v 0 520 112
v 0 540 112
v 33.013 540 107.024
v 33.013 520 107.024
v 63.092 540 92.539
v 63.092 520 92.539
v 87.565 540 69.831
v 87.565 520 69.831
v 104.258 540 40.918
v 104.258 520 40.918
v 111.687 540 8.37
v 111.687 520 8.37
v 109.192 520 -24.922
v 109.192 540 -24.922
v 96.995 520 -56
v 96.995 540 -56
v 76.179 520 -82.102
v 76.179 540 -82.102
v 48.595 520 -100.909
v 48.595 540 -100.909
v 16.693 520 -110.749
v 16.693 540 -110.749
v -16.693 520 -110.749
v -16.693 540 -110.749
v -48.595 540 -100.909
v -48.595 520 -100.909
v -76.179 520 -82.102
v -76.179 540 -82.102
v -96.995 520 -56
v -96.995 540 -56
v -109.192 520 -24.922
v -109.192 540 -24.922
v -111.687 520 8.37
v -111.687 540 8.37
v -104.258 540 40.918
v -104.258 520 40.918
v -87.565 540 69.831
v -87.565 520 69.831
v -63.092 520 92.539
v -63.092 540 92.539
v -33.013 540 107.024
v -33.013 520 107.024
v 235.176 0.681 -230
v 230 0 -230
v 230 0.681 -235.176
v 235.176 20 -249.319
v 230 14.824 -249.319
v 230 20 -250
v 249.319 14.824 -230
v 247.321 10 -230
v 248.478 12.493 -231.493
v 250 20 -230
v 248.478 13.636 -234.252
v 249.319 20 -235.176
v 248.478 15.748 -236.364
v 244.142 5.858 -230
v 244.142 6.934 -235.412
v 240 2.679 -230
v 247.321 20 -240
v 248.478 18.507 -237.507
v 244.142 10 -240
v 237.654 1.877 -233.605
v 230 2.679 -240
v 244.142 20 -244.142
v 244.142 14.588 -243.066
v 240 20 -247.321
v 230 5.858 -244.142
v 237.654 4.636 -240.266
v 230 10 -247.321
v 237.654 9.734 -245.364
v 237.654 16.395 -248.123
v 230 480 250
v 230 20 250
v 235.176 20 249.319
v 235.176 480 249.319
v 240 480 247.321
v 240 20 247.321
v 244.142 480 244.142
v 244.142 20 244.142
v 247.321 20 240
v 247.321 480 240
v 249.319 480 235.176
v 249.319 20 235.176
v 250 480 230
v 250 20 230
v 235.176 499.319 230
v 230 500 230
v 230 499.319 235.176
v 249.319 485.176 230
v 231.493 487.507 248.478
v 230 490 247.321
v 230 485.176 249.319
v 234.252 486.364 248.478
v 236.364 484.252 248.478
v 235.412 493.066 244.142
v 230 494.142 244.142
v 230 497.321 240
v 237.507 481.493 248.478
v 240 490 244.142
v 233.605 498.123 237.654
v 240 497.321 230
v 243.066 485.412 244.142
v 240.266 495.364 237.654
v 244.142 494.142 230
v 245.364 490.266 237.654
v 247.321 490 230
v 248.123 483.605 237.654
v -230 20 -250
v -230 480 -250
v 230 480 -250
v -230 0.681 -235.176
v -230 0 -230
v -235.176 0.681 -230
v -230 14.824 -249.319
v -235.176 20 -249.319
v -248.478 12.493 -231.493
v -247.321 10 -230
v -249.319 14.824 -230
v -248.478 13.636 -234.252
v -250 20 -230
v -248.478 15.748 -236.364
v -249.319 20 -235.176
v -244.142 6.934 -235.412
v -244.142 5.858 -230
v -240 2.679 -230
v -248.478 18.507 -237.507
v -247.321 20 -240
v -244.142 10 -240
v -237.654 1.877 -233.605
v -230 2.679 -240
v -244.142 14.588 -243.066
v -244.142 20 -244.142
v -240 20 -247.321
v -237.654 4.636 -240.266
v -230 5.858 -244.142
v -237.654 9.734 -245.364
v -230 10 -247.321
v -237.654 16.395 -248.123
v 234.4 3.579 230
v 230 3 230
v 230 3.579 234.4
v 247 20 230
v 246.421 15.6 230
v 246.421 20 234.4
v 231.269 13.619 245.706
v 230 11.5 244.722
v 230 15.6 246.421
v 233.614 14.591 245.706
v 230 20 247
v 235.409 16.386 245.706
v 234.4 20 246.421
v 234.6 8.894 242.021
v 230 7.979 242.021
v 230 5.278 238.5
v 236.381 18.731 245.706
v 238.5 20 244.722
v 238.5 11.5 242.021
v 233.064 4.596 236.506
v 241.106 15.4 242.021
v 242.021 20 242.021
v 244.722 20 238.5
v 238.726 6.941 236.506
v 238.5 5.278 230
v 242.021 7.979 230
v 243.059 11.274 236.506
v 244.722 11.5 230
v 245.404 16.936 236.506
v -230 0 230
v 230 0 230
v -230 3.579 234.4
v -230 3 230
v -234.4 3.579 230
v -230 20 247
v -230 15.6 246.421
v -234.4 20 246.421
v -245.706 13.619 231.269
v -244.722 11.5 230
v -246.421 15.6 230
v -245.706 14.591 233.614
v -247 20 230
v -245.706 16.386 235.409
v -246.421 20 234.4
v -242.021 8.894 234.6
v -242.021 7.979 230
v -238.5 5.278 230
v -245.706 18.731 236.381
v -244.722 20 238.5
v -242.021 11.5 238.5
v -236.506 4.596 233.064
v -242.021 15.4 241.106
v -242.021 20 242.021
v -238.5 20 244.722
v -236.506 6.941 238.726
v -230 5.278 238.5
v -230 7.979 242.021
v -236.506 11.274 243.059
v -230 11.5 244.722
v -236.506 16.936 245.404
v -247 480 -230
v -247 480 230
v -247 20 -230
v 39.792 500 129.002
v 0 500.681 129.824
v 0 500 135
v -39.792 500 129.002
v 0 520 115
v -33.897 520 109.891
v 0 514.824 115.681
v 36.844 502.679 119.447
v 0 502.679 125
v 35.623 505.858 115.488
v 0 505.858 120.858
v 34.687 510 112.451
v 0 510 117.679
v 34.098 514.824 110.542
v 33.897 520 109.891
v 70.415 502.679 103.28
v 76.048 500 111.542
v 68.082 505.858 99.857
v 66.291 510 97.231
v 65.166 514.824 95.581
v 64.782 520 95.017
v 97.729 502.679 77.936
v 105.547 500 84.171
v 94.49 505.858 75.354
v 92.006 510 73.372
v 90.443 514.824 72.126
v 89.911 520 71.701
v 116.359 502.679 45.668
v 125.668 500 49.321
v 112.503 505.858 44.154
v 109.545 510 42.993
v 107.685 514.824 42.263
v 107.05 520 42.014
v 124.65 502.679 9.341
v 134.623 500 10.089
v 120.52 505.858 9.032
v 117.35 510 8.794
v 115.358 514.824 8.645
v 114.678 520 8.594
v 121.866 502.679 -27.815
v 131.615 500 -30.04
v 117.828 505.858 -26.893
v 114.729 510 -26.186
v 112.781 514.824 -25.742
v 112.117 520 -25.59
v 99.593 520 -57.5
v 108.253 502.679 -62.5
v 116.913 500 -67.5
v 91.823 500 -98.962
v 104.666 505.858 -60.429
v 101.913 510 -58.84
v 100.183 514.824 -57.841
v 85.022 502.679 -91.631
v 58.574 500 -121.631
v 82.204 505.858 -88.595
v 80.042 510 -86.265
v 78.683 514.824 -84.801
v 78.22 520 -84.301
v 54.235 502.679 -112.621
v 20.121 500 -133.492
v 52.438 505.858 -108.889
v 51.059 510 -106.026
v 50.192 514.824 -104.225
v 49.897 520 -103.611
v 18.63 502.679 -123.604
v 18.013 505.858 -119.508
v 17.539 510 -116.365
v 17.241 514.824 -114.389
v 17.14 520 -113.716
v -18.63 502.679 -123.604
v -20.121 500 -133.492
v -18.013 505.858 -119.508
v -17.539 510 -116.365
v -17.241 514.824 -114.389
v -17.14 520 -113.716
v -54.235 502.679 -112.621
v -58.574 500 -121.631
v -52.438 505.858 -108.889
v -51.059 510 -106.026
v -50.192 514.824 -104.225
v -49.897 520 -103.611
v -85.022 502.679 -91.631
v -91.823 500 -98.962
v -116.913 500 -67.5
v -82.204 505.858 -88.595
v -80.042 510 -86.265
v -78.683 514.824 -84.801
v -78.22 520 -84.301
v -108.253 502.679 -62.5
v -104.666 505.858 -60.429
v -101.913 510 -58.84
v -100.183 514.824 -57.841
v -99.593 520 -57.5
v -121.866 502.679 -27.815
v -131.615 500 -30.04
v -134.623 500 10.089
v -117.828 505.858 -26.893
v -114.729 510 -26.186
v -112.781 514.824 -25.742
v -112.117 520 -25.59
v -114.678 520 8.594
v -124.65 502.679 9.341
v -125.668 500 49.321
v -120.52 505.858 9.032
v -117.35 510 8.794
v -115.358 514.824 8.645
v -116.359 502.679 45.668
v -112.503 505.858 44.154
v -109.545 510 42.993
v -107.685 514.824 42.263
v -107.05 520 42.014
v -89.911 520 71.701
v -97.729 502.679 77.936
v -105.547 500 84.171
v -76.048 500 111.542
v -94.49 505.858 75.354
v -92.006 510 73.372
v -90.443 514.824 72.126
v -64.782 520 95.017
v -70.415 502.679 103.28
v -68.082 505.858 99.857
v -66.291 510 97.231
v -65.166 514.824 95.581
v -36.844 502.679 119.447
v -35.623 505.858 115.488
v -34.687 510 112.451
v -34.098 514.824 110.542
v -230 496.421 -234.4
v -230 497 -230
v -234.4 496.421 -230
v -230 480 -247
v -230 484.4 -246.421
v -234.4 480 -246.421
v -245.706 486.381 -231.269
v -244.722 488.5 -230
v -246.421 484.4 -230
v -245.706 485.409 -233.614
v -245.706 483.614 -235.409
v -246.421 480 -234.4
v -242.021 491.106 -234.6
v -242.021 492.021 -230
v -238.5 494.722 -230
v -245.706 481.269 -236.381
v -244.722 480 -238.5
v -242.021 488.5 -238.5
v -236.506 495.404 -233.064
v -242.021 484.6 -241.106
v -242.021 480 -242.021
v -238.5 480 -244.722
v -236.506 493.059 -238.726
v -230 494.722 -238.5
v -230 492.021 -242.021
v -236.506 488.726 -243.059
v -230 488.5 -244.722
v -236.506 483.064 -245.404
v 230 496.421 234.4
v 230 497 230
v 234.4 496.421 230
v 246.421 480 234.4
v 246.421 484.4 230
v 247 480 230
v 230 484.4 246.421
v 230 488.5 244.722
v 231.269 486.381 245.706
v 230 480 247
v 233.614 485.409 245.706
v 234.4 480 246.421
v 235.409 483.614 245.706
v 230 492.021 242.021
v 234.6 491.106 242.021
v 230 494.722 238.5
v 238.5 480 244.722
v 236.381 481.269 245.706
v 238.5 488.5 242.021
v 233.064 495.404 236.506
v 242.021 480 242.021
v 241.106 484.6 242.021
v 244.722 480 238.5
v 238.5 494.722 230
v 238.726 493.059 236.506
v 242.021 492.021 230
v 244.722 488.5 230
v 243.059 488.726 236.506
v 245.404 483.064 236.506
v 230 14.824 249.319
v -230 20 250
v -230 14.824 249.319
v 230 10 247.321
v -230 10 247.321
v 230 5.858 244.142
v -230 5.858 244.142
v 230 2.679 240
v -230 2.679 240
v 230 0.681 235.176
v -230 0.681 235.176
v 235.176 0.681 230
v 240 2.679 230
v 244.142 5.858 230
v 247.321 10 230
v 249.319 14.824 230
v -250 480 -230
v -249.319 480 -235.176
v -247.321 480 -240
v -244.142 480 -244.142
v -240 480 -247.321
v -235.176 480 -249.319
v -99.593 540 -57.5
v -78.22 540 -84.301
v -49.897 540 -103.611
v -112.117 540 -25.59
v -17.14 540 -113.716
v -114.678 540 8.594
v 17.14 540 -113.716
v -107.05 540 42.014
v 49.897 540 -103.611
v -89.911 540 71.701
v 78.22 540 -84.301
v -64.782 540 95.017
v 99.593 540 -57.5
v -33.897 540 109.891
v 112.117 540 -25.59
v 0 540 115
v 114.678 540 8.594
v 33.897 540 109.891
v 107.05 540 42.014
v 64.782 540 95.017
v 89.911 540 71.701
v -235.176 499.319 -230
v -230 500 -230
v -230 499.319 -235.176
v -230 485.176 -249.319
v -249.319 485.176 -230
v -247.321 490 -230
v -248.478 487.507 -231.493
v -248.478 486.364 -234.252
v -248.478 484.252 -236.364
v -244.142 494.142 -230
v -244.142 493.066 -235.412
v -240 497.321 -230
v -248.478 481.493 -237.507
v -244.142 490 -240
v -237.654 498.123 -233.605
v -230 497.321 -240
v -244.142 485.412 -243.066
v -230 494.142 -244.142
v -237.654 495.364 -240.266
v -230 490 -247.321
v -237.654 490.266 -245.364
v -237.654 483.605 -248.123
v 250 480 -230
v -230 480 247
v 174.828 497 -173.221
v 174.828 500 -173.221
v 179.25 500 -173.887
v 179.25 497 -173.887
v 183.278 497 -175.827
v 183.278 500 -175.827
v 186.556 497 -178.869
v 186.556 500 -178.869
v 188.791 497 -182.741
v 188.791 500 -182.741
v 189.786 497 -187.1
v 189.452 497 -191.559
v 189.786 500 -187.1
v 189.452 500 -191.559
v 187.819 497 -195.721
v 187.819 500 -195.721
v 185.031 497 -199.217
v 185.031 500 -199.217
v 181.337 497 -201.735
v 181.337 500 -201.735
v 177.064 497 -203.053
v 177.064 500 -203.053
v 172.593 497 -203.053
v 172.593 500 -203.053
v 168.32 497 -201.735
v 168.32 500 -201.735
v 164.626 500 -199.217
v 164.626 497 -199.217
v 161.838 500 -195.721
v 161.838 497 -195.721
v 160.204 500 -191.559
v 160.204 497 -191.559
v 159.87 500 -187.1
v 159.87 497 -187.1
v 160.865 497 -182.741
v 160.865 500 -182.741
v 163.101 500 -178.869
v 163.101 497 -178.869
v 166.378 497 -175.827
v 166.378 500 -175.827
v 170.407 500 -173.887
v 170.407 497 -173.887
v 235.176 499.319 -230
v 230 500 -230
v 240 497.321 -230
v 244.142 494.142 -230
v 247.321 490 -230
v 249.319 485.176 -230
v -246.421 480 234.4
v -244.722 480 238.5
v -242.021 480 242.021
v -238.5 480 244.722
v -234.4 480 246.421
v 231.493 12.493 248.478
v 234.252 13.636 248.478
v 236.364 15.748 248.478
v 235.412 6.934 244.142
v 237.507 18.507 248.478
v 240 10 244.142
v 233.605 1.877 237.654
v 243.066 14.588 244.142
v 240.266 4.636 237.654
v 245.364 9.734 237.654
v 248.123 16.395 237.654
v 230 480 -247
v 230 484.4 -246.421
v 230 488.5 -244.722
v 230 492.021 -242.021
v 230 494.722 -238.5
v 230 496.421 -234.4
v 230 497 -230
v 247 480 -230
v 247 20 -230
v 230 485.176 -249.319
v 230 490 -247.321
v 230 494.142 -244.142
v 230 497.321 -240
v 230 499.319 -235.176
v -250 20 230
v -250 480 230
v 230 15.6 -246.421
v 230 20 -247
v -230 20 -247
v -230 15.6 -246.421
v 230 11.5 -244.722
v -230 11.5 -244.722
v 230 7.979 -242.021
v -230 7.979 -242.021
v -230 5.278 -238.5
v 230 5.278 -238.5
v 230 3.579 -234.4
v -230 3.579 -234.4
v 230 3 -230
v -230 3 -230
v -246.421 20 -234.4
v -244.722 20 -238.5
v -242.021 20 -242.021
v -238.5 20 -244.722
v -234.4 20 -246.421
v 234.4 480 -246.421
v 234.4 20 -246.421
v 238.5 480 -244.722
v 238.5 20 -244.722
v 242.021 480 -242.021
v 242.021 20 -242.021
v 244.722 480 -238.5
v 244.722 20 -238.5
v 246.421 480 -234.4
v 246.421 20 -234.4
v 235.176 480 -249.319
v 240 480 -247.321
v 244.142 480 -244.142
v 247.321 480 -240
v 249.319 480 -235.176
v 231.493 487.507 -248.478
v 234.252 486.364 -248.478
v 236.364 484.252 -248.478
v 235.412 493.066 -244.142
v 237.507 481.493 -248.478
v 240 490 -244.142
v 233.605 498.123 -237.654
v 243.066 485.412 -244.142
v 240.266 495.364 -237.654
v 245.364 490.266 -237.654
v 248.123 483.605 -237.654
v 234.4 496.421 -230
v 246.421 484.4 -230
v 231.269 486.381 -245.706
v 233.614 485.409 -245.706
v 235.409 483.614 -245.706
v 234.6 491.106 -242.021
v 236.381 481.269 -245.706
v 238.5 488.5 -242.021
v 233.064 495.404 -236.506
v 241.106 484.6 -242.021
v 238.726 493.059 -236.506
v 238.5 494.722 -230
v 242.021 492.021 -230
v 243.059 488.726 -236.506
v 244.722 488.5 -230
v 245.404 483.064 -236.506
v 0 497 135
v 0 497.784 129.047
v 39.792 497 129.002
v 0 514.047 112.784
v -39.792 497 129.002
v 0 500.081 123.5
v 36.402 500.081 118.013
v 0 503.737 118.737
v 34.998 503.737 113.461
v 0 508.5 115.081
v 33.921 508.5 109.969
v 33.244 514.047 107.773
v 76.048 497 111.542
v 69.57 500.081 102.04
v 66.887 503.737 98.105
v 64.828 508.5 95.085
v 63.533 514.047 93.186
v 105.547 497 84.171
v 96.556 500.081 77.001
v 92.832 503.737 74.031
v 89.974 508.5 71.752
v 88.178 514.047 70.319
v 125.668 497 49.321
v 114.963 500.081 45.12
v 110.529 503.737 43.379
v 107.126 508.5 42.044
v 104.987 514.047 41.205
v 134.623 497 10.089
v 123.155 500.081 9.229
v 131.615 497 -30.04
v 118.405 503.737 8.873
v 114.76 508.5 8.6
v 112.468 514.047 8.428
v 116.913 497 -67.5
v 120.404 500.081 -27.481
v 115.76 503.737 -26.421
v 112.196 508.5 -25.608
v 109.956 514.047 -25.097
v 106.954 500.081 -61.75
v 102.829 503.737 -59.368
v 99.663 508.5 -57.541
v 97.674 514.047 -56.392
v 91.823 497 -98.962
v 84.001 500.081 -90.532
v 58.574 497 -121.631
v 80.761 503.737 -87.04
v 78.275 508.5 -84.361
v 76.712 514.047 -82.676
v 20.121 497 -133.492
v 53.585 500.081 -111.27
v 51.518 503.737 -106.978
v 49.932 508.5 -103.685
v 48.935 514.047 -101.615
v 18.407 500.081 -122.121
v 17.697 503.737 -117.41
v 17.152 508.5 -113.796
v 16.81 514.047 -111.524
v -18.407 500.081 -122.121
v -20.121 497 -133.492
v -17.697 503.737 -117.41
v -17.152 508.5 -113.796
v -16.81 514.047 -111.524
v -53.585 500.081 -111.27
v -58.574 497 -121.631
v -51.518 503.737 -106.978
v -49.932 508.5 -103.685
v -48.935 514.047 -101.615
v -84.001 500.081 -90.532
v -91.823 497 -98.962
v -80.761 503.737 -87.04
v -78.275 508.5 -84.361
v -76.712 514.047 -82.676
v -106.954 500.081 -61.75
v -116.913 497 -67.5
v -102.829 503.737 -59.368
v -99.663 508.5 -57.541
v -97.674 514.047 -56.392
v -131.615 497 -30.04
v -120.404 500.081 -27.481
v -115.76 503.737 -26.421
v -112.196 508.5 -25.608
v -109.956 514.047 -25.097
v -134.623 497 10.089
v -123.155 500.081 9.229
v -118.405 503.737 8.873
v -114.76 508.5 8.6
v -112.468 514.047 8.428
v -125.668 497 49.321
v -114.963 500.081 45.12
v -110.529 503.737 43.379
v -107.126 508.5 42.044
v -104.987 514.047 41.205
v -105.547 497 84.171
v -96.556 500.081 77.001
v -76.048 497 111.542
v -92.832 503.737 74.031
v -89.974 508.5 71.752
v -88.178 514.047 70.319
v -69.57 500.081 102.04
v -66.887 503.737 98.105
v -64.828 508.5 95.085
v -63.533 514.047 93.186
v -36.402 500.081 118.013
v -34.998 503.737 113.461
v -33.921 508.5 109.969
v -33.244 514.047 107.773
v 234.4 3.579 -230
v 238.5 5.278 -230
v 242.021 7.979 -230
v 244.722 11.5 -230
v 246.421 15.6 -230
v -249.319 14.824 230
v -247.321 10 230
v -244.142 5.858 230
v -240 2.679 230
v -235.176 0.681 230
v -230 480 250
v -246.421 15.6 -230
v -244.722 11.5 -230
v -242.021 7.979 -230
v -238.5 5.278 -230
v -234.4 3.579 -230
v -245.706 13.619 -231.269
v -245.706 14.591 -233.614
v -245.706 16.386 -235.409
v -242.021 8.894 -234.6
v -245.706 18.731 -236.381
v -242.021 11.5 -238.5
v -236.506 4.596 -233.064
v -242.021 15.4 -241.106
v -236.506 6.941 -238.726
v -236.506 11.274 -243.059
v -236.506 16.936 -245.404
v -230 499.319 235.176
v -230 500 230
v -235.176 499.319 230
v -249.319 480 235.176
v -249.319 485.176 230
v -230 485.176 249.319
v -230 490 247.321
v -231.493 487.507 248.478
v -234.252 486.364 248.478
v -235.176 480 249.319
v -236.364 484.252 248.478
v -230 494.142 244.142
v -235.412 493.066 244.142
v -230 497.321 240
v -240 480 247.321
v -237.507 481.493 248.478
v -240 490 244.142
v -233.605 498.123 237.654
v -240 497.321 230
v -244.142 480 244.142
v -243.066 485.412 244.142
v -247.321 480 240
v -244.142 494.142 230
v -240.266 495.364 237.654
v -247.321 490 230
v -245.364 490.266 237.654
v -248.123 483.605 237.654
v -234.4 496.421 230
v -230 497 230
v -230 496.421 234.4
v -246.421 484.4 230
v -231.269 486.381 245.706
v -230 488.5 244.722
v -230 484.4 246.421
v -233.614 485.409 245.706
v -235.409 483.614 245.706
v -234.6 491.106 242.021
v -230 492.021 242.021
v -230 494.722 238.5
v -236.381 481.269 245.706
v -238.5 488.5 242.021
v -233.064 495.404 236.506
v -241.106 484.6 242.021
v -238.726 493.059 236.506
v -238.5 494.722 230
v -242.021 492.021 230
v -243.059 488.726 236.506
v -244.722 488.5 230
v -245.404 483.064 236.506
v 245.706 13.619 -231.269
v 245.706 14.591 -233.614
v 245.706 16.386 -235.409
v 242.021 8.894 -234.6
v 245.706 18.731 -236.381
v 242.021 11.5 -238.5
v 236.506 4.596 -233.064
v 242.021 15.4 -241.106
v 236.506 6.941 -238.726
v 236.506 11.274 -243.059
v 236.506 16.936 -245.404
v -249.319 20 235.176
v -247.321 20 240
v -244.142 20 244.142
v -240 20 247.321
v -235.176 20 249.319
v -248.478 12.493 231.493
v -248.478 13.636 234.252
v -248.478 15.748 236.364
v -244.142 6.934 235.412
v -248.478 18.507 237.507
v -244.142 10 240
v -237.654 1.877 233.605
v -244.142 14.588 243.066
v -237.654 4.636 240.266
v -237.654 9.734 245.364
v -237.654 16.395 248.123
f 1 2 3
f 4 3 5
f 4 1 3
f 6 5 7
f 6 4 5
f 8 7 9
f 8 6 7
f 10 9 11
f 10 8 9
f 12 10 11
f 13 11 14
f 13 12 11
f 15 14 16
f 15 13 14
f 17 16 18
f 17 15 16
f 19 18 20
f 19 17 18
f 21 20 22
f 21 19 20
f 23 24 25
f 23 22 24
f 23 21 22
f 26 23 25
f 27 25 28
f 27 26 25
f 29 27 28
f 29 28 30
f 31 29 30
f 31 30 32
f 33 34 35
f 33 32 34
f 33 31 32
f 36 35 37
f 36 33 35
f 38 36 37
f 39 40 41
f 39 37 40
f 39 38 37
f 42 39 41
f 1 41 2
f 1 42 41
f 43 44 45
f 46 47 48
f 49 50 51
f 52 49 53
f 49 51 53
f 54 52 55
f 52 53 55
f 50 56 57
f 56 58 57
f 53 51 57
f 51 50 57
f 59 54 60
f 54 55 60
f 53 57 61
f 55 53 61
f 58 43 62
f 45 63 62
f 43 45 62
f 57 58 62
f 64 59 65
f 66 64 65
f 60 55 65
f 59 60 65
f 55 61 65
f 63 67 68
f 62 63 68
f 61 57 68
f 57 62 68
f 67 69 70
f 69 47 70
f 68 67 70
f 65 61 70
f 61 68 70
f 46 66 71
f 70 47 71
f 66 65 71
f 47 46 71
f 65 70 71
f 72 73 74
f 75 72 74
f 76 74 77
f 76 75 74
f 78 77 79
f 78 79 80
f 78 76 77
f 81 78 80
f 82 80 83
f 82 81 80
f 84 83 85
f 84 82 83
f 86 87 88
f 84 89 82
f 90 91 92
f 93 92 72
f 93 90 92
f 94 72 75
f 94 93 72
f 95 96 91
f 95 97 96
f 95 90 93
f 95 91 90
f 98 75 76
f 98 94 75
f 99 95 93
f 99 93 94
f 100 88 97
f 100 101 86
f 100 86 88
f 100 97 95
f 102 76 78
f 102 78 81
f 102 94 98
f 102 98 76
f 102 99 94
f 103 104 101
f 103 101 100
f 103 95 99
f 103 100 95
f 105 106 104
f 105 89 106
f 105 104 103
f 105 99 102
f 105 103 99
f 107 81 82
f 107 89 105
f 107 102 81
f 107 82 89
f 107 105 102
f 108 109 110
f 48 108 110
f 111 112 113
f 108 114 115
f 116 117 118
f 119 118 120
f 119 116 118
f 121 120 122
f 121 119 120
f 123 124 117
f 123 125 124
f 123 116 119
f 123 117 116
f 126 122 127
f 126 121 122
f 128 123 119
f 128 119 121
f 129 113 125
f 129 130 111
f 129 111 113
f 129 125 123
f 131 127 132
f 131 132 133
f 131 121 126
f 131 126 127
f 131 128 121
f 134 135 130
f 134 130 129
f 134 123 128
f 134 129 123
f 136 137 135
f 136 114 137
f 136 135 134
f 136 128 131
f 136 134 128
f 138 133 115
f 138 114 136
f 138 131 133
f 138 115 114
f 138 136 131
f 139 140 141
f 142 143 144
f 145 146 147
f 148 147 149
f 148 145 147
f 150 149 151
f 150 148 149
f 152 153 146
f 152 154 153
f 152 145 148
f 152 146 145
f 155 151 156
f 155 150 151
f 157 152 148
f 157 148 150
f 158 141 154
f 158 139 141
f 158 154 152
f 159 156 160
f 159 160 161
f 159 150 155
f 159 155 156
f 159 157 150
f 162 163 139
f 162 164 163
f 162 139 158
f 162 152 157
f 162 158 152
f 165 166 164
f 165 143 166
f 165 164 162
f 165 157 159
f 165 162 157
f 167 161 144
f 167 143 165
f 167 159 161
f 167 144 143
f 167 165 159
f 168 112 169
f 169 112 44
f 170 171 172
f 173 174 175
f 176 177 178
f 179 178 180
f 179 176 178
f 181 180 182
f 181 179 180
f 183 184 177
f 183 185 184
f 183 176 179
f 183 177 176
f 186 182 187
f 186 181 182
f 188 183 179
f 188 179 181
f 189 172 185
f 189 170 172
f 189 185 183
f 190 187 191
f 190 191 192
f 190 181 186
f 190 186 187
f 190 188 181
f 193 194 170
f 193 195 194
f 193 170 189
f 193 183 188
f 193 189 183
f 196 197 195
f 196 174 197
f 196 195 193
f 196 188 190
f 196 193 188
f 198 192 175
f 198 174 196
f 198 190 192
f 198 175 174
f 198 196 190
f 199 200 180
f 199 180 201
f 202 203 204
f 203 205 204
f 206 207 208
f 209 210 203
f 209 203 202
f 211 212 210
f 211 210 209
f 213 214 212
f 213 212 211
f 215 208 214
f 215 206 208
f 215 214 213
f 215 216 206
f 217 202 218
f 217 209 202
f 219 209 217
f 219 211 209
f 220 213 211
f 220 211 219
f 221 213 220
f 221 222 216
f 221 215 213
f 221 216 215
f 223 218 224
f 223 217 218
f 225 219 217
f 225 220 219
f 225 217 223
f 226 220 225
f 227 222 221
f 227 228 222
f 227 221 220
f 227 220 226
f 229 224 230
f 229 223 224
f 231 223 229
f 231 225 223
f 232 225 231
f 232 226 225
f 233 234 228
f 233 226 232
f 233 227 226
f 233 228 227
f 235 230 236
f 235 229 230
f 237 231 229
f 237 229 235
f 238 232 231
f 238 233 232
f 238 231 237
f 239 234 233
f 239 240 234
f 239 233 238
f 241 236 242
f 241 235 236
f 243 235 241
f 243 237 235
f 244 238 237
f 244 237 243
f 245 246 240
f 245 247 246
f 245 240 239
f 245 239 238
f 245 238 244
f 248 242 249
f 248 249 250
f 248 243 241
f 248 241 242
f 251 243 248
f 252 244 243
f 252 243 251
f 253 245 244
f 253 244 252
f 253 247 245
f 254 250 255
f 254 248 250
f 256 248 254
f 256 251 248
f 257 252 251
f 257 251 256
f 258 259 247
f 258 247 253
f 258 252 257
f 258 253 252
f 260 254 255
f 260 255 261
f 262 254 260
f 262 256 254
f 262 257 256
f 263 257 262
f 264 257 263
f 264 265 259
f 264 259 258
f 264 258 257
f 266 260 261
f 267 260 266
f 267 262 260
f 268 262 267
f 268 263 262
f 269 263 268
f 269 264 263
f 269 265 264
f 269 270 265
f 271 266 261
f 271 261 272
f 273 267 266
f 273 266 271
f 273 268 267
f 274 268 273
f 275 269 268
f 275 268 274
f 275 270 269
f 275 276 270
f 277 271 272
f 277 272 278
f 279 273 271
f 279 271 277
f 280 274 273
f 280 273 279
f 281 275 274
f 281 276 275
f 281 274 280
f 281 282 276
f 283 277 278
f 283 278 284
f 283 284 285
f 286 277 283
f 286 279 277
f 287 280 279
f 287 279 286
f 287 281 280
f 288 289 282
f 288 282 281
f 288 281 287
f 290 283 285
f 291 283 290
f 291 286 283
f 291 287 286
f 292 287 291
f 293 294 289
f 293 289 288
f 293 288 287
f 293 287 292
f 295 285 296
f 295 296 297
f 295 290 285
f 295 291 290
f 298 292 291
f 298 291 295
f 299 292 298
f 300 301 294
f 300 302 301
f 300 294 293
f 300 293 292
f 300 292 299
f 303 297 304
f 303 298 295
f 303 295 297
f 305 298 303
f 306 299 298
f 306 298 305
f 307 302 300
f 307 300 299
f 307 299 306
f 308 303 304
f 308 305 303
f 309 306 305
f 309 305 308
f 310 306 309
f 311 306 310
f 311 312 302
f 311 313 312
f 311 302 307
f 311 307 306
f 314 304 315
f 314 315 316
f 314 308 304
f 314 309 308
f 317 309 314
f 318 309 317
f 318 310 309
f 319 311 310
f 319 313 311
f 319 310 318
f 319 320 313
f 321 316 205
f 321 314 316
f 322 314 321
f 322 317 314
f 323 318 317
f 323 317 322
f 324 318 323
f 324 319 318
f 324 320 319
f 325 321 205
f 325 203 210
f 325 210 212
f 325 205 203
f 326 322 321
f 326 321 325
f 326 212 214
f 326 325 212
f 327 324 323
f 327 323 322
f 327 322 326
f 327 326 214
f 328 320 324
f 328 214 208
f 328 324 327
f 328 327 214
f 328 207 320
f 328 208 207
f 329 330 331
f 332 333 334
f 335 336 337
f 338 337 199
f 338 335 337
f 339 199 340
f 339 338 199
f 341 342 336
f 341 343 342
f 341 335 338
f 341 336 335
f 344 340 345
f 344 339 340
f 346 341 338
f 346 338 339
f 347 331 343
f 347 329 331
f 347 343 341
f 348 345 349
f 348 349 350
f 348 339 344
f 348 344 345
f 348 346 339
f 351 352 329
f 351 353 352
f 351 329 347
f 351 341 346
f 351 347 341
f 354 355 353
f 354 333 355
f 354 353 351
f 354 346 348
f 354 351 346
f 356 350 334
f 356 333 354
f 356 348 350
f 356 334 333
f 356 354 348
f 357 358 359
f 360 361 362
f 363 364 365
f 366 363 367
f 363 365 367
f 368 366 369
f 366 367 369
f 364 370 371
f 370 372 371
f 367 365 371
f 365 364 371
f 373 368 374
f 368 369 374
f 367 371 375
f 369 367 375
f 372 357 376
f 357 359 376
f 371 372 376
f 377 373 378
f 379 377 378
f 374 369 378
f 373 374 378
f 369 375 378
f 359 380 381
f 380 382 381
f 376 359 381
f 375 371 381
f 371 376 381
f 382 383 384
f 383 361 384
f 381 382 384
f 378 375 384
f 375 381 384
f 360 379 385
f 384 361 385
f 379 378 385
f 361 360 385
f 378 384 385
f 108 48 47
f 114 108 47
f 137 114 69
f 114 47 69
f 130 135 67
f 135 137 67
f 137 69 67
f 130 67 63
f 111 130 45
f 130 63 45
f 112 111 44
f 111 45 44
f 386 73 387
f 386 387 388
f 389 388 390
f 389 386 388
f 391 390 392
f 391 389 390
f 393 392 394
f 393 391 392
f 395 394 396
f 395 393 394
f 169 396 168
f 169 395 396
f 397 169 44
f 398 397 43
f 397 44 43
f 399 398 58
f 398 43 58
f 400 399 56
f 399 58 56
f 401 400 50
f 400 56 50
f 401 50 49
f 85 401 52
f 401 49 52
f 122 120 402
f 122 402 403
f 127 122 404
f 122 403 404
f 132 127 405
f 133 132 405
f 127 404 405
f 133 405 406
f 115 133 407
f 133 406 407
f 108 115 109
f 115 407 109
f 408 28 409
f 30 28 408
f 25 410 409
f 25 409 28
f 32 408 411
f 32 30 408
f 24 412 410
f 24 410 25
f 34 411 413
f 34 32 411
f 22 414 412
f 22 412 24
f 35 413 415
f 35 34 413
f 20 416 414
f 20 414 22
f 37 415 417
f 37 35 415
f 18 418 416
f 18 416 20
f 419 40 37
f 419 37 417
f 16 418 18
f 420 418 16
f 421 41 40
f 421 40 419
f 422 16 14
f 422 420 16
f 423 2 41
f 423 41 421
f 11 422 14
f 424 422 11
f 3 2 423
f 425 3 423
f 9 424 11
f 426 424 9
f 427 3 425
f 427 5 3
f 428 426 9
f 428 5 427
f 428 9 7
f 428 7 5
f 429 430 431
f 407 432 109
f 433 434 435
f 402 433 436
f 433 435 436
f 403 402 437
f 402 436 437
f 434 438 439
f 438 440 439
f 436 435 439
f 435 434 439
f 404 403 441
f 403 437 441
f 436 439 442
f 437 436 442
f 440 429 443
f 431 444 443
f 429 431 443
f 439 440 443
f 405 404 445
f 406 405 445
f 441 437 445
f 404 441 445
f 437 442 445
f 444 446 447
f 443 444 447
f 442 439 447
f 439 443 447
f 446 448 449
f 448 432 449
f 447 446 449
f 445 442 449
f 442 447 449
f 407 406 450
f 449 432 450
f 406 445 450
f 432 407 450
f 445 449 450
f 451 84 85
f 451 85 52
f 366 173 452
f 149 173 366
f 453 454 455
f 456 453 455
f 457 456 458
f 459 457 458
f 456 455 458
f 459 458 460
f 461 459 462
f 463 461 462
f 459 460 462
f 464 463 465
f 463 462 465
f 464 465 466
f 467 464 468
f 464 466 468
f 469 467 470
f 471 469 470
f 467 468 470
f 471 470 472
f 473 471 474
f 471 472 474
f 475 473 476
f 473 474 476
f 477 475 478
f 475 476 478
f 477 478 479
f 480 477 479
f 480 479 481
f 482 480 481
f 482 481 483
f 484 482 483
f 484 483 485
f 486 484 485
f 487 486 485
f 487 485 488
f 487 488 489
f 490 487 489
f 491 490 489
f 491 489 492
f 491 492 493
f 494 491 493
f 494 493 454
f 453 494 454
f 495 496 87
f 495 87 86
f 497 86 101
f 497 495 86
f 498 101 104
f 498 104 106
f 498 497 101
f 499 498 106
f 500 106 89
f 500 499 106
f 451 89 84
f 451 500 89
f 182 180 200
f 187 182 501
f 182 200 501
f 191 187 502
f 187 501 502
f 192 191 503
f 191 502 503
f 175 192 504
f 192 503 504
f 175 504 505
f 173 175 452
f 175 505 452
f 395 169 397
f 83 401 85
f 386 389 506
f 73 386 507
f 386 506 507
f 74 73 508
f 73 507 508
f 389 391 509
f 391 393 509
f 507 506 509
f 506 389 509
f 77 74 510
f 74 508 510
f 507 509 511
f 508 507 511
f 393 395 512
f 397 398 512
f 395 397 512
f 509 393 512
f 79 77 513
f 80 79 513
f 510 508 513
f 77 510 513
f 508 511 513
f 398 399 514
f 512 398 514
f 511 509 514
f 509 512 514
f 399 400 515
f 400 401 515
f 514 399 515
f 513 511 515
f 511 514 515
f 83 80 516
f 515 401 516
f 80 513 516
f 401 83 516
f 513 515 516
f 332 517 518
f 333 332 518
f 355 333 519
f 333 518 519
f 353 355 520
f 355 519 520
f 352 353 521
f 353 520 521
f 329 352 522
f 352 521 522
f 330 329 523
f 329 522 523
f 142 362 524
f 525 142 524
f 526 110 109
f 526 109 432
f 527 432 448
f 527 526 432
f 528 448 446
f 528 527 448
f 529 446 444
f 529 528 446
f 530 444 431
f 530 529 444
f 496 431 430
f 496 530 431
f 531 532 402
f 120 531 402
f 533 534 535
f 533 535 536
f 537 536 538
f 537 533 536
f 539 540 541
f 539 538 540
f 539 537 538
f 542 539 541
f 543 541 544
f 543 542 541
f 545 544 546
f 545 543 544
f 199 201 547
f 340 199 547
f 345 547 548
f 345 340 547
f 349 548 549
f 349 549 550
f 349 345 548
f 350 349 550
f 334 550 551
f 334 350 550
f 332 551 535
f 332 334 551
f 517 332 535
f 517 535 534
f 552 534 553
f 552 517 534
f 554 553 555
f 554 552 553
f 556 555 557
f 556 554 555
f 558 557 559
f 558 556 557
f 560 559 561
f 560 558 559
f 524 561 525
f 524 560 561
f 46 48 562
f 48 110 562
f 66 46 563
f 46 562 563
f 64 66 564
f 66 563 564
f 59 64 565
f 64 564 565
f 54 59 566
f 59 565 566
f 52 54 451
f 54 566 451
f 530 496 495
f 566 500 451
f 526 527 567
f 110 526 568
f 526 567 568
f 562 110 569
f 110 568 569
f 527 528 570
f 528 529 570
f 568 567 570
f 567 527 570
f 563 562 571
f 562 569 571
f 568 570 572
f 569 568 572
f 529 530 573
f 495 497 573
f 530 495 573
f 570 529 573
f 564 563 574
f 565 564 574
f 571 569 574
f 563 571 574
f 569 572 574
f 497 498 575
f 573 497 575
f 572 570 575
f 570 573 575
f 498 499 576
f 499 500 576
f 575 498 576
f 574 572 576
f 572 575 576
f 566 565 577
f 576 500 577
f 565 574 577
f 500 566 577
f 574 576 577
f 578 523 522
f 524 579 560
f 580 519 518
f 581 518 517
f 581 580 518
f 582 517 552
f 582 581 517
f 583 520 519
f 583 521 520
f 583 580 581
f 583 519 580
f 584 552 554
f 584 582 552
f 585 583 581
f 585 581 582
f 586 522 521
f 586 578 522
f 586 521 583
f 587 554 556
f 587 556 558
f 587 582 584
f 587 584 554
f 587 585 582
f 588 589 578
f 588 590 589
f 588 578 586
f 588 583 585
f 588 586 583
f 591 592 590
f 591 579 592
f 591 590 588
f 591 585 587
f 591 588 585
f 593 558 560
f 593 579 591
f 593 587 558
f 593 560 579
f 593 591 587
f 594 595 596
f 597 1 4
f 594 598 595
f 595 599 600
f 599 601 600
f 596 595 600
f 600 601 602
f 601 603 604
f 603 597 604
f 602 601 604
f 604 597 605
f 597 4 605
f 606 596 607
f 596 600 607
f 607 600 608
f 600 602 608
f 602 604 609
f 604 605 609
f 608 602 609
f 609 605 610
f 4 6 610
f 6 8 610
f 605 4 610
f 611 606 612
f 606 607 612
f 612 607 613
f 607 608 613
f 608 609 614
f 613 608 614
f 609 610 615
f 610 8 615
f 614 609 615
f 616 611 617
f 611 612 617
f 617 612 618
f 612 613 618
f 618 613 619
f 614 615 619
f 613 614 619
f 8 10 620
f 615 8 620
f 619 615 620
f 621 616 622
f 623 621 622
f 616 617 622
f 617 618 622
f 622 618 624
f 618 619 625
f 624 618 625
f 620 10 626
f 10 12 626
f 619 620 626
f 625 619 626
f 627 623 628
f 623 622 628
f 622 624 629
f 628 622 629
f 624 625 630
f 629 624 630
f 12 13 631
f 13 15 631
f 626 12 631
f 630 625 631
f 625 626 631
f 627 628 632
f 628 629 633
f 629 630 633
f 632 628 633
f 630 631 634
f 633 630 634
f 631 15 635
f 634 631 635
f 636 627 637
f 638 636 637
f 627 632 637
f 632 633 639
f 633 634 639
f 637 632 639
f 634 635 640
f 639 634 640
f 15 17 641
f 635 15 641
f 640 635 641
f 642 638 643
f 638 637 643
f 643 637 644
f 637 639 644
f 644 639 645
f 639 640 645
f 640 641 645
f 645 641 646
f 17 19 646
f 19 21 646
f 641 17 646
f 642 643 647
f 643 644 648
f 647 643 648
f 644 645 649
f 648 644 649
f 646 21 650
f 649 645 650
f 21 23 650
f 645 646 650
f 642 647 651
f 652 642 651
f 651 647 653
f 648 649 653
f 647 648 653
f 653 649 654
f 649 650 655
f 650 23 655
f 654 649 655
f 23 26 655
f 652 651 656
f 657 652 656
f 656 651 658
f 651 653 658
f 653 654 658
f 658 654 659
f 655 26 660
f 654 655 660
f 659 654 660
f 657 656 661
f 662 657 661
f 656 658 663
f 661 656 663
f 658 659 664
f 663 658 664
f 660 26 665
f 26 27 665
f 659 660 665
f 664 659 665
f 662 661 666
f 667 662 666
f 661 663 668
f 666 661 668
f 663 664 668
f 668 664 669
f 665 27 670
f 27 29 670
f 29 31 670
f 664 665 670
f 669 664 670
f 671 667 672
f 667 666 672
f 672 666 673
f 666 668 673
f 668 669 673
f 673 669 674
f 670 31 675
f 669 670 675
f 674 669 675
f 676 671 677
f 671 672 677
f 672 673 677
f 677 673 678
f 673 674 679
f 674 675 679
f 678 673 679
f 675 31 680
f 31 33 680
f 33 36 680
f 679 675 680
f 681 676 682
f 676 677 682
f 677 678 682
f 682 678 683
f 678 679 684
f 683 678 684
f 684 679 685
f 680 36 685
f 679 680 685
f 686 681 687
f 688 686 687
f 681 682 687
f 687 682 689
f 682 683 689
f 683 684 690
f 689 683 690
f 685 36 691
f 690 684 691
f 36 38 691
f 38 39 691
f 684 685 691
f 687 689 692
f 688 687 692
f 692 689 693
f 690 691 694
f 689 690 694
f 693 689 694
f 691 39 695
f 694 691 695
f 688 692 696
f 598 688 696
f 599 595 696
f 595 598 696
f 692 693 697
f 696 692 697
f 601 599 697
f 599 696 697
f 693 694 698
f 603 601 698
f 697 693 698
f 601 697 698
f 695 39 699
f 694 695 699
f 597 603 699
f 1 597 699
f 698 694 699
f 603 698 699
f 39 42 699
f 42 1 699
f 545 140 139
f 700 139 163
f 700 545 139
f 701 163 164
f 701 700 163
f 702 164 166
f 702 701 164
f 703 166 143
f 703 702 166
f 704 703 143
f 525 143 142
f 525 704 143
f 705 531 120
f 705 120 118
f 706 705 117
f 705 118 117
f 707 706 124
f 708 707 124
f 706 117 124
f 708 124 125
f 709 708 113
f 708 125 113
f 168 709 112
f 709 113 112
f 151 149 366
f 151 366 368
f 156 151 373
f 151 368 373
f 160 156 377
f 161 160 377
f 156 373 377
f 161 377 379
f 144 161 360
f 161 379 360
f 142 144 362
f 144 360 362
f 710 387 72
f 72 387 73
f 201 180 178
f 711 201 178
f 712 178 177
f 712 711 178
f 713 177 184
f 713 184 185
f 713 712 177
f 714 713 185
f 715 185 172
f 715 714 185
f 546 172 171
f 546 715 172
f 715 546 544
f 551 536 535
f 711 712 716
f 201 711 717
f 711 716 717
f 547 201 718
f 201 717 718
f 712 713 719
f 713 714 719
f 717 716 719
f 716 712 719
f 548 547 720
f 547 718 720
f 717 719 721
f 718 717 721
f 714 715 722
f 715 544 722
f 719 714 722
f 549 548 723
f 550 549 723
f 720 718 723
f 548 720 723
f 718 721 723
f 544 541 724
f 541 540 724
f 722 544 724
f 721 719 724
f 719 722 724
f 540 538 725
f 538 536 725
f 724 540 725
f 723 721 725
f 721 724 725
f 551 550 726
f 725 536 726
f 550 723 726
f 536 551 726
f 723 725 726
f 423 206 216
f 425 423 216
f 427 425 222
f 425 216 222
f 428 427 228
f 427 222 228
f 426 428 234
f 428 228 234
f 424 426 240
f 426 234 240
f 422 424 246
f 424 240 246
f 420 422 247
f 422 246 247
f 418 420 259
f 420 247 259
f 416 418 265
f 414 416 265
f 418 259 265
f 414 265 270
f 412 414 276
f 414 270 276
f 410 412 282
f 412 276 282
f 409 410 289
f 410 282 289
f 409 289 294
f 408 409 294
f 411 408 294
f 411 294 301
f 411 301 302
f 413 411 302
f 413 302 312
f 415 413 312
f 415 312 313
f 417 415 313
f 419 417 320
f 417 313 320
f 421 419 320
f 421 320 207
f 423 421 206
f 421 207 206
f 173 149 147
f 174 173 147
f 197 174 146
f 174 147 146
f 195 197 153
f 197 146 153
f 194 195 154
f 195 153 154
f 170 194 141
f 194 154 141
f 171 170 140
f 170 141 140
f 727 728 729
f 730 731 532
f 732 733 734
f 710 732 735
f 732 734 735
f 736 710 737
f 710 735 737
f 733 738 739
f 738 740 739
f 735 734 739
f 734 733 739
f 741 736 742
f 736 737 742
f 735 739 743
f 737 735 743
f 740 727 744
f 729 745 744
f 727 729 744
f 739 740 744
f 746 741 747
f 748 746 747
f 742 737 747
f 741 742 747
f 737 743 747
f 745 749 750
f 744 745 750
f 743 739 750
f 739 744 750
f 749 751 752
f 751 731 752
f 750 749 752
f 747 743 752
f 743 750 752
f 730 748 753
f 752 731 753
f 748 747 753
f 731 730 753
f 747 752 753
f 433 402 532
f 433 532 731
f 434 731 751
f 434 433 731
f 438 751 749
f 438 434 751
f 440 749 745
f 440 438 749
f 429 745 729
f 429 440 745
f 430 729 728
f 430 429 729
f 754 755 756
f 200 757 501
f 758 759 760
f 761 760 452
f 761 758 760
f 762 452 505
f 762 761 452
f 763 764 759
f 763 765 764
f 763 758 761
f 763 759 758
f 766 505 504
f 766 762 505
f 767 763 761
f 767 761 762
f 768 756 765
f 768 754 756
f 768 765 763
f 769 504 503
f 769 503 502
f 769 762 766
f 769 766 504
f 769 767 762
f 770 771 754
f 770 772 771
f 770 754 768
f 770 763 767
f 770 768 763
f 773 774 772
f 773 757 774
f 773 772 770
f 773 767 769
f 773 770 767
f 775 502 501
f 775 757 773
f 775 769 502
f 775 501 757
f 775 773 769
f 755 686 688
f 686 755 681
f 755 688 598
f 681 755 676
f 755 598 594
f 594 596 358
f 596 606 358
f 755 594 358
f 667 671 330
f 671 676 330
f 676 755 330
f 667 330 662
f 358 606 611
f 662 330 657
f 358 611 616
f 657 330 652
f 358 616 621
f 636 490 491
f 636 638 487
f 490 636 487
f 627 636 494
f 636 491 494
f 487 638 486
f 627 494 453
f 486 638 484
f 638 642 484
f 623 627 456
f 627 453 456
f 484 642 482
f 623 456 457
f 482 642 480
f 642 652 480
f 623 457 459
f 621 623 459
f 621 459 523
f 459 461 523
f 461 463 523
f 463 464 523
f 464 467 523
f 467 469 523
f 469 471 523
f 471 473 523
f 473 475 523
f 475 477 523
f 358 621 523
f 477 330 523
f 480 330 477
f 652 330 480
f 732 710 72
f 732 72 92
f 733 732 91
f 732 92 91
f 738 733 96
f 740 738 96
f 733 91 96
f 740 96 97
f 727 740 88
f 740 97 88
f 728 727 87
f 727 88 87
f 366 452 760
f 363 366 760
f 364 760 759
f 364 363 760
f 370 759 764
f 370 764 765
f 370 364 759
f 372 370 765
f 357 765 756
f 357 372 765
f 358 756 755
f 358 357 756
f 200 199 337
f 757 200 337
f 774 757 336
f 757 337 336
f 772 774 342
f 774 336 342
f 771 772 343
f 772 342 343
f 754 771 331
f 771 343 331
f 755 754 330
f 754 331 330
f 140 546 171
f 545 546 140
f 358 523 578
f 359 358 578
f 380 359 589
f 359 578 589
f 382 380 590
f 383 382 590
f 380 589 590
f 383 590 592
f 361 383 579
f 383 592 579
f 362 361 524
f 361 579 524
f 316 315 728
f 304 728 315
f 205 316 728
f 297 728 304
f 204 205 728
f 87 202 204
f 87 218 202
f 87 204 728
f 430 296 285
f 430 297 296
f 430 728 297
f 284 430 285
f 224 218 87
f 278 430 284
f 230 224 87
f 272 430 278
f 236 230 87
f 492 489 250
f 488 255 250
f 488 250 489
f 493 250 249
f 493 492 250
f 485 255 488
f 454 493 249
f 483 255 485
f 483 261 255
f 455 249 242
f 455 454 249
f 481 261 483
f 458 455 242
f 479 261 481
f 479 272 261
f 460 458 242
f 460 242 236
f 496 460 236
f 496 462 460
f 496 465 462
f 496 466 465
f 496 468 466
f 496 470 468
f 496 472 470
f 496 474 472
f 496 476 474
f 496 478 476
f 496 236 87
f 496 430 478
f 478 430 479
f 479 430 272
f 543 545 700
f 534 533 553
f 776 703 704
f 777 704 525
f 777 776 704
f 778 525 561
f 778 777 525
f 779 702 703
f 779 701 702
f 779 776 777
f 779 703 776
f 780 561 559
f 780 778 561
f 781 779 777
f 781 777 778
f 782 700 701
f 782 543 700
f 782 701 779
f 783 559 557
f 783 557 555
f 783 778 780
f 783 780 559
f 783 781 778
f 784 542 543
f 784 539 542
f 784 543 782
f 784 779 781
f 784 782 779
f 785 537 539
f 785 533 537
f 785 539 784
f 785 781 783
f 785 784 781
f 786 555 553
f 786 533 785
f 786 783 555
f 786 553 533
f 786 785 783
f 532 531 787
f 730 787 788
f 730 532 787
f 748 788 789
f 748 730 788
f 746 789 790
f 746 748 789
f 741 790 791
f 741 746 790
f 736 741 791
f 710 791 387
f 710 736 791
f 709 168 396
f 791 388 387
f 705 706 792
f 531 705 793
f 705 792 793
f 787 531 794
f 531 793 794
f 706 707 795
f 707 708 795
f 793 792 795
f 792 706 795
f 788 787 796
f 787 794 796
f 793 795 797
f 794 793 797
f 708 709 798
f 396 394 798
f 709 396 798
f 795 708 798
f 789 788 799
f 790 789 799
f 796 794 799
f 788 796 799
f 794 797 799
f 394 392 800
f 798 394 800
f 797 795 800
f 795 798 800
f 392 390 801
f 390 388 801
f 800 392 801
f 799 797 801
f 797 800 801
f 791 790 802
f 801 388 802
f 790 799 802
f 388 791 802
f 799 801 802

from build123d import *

# Parameters (mm, degrees)
CROQUIS1_W     = 500
CROQUIS1_H     = 500
EXTRUIR1_DEPTH = 500
CROQUIS2_R     = 115
EXTRUIR2_DEPTH = 40
REDONDEO1_R    = 20
VACIADO1_T     = -3
CROQUIS3_R     = 15
EXTRUIR3_DEPTH = 30


with BuildPart() as part:
    # Croquis1 → Extruir1 (new body)
    with BuildSketch(Plane(origin=(0, 0, 0), x_dir=(1, 0, 0), z_dir=(0, 1, 0))):
        Rectangle(CROQUIS1_W, CROQUIS1_H)
    extrude(amount=EXTRUIR1_DEPTH)

    # Croquis2 → Extruir2 (add)
    with BuildSketch(Plane(origin=(0, 500, 0), x_dir=(1, 0, 0), z_dir=(0, 1, 0))):
        with Locations(Location((0, 0, 0), (0, 0, 270))):
            Circle(CROQUIS2_R)
    extrude(amount=EXTRUIR2_DEPTH)

    # Redondeo1
    redondeo1_edges = [part.edges().sort_by_distance(p)[0] for p in [
        (250, 500, 0),
        (0, 500, -250),
        (0, 500, -115),
        (-250, 500, 0),
        (0, 0, -250),
        (250, 0, 0),
        (0, 0, 250),
        (-250, 0, 0),
        (0, 500, 250),
        (-250, 250, -250),
        (250, 250, -250),
        (250, 250, 250),
        (-250, 250, 250),
    ]]
    fillet(redondeo1_edges, radius=REDONDEO1_R)

    # Vaciado1
    vaciado1_openings = [part.faces().sort_by_distance(p)[0] for p in [
        (0, 540, 0),
    ]]
    offset(amount=VACIADO1_T, openings=vaciado1_openings, kind=Kind.INTERSECTION)

    # Croquis3 → Extruir3 (cut)
    with BuildSketch(Plane(origin=(0, 500, 0), x_dir=(1, 0, 0), z_dir=(0, 1, 0))):
        with Locations(Location((174.828263658, 188.220904974, 0), (0, 0, 270))):
            Circle(CROQUIS3_R)
    extrude(amount=-EXTRUIR3_DEPTH, mode=Mode.SUBTRACT)


solid = part.part
